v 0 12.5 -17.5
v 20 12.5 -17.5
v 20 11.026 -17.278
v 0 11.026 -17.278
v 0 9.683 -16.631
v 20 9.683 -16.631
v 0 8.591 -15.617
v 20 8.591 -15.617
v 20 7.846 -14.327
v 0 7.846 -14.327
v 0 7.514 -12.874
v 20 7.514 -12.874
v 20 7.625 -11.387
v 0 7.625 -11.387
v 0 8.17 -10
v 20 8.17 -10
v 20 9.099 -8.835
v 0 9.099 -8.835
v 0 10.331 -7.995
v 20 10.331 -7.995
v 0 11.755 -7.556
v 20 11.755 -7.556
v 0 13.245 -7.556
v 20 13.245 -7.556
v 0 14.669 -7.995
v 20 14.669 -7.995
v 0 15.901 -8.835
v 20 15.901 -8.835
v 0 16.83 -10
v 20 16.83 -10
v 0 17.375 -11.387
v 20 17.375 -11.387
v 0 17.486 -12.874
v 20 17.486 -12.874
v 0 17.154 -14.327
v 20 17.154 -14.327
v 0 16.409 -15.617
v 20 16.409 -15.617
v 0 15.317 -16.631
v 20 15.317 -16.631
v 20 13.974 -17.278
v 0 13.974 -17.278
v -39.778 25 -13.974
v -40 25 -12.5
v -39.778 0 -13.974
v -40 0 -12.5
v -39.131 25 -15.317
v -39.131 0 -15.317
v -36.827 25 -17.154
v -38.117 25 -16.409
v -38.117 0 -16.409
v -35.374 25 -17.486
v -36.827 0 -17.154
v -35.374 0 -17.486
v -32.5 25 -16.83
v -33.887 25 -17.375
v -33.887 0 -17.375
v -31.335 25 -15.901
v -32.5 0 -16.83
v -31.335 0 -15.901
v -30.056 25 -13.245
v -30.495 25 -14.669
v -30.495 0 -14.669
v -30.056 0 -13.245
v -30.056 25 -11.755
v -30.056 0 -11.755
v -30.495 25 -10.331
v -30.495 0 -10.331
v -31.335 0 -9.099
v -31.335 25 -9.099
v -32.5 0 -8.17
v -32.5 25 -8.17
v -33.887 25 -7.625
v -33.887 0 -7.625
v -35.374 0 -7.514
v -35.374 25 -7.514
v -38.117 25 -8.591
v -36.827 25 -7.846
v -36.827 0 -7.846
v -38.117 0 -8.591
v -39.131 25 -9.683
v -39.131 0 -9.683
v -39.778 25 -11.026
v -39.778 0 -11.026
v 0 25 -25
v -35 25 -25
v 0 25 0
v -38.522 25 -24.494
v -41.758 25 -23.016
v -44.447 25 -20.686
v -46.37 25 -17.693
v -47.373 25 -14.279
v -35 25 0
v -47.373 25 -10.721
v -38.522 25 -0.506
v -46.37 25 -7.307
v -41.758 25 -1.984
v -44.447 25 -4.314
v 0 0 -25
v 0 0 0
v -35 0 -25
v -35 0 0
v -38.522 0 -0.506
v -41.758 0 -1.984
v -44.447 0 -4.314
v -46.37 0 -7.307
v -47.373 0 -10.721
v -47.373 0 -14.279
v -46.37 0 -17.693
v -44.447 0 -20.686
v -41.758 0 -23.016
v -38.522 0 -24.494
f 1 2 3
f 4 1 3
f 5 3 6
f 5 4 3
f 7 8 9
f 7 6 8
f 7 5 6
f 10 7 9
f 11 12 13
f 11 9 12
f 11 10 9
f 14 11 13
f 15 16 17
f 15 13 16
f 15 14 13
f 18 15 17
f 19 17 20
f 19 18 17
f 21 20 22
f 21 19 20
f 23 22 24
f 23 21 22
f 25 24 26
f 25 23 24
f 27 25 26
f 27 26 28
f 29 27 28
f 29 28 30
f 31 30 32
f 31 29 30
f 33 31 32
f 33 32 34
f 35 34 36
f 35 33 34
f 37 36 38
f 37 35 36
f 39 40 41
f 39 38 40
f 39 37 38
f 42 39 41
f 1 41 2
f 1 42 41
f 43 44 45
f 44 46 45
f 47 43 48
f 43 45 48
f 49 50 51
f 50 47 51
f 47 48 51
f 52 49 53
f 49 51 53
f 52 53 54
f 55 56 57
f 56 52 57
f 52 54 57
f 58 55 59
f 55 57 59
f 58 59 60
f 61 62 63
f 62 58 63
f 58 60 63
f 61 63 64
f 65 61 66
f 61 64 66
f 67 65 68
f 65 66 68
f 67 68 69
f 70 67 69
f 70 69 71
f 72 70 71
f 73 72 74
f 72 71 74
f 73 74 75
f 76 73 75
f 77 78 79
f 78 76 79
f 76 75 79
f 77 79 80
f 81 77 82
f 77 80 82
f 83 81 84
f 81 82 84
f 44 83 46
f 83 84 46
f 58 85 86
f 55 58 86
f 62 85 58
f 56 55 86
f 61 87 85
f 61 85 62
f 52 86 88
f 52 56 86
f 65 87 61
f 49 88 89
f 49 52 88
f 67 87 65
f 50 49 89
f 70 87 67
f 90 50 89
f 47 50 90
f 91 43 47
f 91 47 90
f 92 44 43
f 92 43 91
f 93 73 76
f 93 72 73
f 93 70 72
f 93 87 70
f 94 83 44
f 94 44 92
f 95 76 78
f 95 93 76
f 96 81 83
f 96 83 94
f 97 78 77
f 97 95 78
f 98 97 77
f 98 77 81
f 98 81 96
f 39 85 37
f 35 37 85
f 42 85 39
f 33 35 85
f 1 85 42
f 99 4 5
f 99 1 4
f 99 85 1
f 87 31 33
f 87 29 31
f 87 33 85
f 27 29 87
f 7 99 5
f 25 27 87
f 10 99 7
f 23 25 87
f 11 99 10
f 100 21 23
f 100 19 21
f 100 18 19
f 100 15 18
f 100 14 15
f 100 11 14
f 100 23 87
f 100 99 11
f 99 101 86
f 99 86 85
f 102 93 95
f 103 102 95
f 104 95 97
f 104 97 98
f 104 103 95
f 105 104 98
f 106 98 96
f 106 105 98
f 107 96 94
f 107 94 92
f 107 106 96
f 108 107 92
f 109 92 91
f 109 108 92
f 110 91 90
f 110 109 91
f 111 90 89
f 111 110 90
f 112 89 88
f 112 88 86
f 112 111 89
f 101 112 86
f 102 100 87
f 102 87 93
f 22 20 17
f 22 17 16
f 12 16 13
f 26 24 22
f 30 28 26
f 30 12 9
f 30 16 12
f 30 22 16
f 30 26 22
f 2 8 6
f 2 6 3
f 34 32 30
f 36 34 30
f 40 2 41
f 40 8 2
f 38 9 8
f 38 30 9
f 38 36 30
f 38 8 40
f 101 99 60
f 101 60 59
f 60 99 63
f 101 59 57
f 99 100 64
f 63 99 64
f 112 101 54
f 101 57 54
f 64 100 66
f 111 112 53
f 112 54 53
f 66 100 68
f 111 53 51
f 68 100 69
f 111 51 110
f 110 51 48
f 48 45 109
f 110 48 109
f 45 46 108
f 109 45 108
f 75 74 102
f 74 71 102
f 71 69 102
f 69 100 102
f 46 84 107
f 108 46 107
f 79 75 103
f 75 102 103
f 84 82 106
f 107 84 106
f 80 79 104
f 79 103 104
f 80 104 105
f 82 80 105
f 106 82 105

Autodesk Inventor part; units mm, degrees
ref_plane "YZ Plane" through (0, 0, 0) normal (1, 0, 0) x (0, 1, 0)
ref_plane "XZ Plane" through (0, 0, 0) normal (0, 1, 0) x (-1, 0, 0)
sketch "Boceto1" plane through (0, 0, 0) normal (0, 1, 0) x (-1, 0, 0)
  line L0 (0, 0) -> (35, 0)
  line L1 (47.5, -12.5) -> (47.5, -12.5)
  line L2 (35, -25) -> (0, -25)
  line L3 (0, -25) -> (0, 0)
  line L4 (47.5, -12.5) -> (0, -12.5) construction
  arc A0 (47.5, -12.5) -> (35, 0) centre (35, -12.5) ccw
  arc A1 (35, -25) -> (47.5, -12.5) centre (35, -12.5) ccw
  circle A2 centre (35, -12.5) radius 5
  point P0 (47.5, -25)
  point P1 (47.5, 0)
  dimension "d0" = 25
  dimension "d1" = 47.5
  dimension "d15" = 12.5
  dimension "d16" = 10
ref_plane "Plano de trabajo1" through (0, 0, 0) normal (1, 0, 0) x (0, 0, -1)
extrude "Extrusión3" add sketch "Boceto1" along normal blind 25
sketch "Boceto3" plane through (0, 0, 0) normal (1, 0, 0) x (0, 0, -1)
  circle A0 centre (12.5, 12.5) radius 5
  line L0 (25, 0) -> (25, 25) projected
  line L1 (0, 25) -> (25, 25) projected
  point P0 (0, 0)
  dimension "d19" = 10
  dimension "d20" = 12.5
  dimension "d21" = 12.5
extrude "Extrusión4" add sketch "Boceto3" along normal blind 20
thread "Rosca3" size "M10x1.5" class "6g" standard "ANSI Metric M Profile" full length
thread "Rosca4" size "M10x1.5" class "6H" standard "ANSI Metric M Profile" full length
properties part number "brazos_planetarios1" material "Acetal Resin, Black"
